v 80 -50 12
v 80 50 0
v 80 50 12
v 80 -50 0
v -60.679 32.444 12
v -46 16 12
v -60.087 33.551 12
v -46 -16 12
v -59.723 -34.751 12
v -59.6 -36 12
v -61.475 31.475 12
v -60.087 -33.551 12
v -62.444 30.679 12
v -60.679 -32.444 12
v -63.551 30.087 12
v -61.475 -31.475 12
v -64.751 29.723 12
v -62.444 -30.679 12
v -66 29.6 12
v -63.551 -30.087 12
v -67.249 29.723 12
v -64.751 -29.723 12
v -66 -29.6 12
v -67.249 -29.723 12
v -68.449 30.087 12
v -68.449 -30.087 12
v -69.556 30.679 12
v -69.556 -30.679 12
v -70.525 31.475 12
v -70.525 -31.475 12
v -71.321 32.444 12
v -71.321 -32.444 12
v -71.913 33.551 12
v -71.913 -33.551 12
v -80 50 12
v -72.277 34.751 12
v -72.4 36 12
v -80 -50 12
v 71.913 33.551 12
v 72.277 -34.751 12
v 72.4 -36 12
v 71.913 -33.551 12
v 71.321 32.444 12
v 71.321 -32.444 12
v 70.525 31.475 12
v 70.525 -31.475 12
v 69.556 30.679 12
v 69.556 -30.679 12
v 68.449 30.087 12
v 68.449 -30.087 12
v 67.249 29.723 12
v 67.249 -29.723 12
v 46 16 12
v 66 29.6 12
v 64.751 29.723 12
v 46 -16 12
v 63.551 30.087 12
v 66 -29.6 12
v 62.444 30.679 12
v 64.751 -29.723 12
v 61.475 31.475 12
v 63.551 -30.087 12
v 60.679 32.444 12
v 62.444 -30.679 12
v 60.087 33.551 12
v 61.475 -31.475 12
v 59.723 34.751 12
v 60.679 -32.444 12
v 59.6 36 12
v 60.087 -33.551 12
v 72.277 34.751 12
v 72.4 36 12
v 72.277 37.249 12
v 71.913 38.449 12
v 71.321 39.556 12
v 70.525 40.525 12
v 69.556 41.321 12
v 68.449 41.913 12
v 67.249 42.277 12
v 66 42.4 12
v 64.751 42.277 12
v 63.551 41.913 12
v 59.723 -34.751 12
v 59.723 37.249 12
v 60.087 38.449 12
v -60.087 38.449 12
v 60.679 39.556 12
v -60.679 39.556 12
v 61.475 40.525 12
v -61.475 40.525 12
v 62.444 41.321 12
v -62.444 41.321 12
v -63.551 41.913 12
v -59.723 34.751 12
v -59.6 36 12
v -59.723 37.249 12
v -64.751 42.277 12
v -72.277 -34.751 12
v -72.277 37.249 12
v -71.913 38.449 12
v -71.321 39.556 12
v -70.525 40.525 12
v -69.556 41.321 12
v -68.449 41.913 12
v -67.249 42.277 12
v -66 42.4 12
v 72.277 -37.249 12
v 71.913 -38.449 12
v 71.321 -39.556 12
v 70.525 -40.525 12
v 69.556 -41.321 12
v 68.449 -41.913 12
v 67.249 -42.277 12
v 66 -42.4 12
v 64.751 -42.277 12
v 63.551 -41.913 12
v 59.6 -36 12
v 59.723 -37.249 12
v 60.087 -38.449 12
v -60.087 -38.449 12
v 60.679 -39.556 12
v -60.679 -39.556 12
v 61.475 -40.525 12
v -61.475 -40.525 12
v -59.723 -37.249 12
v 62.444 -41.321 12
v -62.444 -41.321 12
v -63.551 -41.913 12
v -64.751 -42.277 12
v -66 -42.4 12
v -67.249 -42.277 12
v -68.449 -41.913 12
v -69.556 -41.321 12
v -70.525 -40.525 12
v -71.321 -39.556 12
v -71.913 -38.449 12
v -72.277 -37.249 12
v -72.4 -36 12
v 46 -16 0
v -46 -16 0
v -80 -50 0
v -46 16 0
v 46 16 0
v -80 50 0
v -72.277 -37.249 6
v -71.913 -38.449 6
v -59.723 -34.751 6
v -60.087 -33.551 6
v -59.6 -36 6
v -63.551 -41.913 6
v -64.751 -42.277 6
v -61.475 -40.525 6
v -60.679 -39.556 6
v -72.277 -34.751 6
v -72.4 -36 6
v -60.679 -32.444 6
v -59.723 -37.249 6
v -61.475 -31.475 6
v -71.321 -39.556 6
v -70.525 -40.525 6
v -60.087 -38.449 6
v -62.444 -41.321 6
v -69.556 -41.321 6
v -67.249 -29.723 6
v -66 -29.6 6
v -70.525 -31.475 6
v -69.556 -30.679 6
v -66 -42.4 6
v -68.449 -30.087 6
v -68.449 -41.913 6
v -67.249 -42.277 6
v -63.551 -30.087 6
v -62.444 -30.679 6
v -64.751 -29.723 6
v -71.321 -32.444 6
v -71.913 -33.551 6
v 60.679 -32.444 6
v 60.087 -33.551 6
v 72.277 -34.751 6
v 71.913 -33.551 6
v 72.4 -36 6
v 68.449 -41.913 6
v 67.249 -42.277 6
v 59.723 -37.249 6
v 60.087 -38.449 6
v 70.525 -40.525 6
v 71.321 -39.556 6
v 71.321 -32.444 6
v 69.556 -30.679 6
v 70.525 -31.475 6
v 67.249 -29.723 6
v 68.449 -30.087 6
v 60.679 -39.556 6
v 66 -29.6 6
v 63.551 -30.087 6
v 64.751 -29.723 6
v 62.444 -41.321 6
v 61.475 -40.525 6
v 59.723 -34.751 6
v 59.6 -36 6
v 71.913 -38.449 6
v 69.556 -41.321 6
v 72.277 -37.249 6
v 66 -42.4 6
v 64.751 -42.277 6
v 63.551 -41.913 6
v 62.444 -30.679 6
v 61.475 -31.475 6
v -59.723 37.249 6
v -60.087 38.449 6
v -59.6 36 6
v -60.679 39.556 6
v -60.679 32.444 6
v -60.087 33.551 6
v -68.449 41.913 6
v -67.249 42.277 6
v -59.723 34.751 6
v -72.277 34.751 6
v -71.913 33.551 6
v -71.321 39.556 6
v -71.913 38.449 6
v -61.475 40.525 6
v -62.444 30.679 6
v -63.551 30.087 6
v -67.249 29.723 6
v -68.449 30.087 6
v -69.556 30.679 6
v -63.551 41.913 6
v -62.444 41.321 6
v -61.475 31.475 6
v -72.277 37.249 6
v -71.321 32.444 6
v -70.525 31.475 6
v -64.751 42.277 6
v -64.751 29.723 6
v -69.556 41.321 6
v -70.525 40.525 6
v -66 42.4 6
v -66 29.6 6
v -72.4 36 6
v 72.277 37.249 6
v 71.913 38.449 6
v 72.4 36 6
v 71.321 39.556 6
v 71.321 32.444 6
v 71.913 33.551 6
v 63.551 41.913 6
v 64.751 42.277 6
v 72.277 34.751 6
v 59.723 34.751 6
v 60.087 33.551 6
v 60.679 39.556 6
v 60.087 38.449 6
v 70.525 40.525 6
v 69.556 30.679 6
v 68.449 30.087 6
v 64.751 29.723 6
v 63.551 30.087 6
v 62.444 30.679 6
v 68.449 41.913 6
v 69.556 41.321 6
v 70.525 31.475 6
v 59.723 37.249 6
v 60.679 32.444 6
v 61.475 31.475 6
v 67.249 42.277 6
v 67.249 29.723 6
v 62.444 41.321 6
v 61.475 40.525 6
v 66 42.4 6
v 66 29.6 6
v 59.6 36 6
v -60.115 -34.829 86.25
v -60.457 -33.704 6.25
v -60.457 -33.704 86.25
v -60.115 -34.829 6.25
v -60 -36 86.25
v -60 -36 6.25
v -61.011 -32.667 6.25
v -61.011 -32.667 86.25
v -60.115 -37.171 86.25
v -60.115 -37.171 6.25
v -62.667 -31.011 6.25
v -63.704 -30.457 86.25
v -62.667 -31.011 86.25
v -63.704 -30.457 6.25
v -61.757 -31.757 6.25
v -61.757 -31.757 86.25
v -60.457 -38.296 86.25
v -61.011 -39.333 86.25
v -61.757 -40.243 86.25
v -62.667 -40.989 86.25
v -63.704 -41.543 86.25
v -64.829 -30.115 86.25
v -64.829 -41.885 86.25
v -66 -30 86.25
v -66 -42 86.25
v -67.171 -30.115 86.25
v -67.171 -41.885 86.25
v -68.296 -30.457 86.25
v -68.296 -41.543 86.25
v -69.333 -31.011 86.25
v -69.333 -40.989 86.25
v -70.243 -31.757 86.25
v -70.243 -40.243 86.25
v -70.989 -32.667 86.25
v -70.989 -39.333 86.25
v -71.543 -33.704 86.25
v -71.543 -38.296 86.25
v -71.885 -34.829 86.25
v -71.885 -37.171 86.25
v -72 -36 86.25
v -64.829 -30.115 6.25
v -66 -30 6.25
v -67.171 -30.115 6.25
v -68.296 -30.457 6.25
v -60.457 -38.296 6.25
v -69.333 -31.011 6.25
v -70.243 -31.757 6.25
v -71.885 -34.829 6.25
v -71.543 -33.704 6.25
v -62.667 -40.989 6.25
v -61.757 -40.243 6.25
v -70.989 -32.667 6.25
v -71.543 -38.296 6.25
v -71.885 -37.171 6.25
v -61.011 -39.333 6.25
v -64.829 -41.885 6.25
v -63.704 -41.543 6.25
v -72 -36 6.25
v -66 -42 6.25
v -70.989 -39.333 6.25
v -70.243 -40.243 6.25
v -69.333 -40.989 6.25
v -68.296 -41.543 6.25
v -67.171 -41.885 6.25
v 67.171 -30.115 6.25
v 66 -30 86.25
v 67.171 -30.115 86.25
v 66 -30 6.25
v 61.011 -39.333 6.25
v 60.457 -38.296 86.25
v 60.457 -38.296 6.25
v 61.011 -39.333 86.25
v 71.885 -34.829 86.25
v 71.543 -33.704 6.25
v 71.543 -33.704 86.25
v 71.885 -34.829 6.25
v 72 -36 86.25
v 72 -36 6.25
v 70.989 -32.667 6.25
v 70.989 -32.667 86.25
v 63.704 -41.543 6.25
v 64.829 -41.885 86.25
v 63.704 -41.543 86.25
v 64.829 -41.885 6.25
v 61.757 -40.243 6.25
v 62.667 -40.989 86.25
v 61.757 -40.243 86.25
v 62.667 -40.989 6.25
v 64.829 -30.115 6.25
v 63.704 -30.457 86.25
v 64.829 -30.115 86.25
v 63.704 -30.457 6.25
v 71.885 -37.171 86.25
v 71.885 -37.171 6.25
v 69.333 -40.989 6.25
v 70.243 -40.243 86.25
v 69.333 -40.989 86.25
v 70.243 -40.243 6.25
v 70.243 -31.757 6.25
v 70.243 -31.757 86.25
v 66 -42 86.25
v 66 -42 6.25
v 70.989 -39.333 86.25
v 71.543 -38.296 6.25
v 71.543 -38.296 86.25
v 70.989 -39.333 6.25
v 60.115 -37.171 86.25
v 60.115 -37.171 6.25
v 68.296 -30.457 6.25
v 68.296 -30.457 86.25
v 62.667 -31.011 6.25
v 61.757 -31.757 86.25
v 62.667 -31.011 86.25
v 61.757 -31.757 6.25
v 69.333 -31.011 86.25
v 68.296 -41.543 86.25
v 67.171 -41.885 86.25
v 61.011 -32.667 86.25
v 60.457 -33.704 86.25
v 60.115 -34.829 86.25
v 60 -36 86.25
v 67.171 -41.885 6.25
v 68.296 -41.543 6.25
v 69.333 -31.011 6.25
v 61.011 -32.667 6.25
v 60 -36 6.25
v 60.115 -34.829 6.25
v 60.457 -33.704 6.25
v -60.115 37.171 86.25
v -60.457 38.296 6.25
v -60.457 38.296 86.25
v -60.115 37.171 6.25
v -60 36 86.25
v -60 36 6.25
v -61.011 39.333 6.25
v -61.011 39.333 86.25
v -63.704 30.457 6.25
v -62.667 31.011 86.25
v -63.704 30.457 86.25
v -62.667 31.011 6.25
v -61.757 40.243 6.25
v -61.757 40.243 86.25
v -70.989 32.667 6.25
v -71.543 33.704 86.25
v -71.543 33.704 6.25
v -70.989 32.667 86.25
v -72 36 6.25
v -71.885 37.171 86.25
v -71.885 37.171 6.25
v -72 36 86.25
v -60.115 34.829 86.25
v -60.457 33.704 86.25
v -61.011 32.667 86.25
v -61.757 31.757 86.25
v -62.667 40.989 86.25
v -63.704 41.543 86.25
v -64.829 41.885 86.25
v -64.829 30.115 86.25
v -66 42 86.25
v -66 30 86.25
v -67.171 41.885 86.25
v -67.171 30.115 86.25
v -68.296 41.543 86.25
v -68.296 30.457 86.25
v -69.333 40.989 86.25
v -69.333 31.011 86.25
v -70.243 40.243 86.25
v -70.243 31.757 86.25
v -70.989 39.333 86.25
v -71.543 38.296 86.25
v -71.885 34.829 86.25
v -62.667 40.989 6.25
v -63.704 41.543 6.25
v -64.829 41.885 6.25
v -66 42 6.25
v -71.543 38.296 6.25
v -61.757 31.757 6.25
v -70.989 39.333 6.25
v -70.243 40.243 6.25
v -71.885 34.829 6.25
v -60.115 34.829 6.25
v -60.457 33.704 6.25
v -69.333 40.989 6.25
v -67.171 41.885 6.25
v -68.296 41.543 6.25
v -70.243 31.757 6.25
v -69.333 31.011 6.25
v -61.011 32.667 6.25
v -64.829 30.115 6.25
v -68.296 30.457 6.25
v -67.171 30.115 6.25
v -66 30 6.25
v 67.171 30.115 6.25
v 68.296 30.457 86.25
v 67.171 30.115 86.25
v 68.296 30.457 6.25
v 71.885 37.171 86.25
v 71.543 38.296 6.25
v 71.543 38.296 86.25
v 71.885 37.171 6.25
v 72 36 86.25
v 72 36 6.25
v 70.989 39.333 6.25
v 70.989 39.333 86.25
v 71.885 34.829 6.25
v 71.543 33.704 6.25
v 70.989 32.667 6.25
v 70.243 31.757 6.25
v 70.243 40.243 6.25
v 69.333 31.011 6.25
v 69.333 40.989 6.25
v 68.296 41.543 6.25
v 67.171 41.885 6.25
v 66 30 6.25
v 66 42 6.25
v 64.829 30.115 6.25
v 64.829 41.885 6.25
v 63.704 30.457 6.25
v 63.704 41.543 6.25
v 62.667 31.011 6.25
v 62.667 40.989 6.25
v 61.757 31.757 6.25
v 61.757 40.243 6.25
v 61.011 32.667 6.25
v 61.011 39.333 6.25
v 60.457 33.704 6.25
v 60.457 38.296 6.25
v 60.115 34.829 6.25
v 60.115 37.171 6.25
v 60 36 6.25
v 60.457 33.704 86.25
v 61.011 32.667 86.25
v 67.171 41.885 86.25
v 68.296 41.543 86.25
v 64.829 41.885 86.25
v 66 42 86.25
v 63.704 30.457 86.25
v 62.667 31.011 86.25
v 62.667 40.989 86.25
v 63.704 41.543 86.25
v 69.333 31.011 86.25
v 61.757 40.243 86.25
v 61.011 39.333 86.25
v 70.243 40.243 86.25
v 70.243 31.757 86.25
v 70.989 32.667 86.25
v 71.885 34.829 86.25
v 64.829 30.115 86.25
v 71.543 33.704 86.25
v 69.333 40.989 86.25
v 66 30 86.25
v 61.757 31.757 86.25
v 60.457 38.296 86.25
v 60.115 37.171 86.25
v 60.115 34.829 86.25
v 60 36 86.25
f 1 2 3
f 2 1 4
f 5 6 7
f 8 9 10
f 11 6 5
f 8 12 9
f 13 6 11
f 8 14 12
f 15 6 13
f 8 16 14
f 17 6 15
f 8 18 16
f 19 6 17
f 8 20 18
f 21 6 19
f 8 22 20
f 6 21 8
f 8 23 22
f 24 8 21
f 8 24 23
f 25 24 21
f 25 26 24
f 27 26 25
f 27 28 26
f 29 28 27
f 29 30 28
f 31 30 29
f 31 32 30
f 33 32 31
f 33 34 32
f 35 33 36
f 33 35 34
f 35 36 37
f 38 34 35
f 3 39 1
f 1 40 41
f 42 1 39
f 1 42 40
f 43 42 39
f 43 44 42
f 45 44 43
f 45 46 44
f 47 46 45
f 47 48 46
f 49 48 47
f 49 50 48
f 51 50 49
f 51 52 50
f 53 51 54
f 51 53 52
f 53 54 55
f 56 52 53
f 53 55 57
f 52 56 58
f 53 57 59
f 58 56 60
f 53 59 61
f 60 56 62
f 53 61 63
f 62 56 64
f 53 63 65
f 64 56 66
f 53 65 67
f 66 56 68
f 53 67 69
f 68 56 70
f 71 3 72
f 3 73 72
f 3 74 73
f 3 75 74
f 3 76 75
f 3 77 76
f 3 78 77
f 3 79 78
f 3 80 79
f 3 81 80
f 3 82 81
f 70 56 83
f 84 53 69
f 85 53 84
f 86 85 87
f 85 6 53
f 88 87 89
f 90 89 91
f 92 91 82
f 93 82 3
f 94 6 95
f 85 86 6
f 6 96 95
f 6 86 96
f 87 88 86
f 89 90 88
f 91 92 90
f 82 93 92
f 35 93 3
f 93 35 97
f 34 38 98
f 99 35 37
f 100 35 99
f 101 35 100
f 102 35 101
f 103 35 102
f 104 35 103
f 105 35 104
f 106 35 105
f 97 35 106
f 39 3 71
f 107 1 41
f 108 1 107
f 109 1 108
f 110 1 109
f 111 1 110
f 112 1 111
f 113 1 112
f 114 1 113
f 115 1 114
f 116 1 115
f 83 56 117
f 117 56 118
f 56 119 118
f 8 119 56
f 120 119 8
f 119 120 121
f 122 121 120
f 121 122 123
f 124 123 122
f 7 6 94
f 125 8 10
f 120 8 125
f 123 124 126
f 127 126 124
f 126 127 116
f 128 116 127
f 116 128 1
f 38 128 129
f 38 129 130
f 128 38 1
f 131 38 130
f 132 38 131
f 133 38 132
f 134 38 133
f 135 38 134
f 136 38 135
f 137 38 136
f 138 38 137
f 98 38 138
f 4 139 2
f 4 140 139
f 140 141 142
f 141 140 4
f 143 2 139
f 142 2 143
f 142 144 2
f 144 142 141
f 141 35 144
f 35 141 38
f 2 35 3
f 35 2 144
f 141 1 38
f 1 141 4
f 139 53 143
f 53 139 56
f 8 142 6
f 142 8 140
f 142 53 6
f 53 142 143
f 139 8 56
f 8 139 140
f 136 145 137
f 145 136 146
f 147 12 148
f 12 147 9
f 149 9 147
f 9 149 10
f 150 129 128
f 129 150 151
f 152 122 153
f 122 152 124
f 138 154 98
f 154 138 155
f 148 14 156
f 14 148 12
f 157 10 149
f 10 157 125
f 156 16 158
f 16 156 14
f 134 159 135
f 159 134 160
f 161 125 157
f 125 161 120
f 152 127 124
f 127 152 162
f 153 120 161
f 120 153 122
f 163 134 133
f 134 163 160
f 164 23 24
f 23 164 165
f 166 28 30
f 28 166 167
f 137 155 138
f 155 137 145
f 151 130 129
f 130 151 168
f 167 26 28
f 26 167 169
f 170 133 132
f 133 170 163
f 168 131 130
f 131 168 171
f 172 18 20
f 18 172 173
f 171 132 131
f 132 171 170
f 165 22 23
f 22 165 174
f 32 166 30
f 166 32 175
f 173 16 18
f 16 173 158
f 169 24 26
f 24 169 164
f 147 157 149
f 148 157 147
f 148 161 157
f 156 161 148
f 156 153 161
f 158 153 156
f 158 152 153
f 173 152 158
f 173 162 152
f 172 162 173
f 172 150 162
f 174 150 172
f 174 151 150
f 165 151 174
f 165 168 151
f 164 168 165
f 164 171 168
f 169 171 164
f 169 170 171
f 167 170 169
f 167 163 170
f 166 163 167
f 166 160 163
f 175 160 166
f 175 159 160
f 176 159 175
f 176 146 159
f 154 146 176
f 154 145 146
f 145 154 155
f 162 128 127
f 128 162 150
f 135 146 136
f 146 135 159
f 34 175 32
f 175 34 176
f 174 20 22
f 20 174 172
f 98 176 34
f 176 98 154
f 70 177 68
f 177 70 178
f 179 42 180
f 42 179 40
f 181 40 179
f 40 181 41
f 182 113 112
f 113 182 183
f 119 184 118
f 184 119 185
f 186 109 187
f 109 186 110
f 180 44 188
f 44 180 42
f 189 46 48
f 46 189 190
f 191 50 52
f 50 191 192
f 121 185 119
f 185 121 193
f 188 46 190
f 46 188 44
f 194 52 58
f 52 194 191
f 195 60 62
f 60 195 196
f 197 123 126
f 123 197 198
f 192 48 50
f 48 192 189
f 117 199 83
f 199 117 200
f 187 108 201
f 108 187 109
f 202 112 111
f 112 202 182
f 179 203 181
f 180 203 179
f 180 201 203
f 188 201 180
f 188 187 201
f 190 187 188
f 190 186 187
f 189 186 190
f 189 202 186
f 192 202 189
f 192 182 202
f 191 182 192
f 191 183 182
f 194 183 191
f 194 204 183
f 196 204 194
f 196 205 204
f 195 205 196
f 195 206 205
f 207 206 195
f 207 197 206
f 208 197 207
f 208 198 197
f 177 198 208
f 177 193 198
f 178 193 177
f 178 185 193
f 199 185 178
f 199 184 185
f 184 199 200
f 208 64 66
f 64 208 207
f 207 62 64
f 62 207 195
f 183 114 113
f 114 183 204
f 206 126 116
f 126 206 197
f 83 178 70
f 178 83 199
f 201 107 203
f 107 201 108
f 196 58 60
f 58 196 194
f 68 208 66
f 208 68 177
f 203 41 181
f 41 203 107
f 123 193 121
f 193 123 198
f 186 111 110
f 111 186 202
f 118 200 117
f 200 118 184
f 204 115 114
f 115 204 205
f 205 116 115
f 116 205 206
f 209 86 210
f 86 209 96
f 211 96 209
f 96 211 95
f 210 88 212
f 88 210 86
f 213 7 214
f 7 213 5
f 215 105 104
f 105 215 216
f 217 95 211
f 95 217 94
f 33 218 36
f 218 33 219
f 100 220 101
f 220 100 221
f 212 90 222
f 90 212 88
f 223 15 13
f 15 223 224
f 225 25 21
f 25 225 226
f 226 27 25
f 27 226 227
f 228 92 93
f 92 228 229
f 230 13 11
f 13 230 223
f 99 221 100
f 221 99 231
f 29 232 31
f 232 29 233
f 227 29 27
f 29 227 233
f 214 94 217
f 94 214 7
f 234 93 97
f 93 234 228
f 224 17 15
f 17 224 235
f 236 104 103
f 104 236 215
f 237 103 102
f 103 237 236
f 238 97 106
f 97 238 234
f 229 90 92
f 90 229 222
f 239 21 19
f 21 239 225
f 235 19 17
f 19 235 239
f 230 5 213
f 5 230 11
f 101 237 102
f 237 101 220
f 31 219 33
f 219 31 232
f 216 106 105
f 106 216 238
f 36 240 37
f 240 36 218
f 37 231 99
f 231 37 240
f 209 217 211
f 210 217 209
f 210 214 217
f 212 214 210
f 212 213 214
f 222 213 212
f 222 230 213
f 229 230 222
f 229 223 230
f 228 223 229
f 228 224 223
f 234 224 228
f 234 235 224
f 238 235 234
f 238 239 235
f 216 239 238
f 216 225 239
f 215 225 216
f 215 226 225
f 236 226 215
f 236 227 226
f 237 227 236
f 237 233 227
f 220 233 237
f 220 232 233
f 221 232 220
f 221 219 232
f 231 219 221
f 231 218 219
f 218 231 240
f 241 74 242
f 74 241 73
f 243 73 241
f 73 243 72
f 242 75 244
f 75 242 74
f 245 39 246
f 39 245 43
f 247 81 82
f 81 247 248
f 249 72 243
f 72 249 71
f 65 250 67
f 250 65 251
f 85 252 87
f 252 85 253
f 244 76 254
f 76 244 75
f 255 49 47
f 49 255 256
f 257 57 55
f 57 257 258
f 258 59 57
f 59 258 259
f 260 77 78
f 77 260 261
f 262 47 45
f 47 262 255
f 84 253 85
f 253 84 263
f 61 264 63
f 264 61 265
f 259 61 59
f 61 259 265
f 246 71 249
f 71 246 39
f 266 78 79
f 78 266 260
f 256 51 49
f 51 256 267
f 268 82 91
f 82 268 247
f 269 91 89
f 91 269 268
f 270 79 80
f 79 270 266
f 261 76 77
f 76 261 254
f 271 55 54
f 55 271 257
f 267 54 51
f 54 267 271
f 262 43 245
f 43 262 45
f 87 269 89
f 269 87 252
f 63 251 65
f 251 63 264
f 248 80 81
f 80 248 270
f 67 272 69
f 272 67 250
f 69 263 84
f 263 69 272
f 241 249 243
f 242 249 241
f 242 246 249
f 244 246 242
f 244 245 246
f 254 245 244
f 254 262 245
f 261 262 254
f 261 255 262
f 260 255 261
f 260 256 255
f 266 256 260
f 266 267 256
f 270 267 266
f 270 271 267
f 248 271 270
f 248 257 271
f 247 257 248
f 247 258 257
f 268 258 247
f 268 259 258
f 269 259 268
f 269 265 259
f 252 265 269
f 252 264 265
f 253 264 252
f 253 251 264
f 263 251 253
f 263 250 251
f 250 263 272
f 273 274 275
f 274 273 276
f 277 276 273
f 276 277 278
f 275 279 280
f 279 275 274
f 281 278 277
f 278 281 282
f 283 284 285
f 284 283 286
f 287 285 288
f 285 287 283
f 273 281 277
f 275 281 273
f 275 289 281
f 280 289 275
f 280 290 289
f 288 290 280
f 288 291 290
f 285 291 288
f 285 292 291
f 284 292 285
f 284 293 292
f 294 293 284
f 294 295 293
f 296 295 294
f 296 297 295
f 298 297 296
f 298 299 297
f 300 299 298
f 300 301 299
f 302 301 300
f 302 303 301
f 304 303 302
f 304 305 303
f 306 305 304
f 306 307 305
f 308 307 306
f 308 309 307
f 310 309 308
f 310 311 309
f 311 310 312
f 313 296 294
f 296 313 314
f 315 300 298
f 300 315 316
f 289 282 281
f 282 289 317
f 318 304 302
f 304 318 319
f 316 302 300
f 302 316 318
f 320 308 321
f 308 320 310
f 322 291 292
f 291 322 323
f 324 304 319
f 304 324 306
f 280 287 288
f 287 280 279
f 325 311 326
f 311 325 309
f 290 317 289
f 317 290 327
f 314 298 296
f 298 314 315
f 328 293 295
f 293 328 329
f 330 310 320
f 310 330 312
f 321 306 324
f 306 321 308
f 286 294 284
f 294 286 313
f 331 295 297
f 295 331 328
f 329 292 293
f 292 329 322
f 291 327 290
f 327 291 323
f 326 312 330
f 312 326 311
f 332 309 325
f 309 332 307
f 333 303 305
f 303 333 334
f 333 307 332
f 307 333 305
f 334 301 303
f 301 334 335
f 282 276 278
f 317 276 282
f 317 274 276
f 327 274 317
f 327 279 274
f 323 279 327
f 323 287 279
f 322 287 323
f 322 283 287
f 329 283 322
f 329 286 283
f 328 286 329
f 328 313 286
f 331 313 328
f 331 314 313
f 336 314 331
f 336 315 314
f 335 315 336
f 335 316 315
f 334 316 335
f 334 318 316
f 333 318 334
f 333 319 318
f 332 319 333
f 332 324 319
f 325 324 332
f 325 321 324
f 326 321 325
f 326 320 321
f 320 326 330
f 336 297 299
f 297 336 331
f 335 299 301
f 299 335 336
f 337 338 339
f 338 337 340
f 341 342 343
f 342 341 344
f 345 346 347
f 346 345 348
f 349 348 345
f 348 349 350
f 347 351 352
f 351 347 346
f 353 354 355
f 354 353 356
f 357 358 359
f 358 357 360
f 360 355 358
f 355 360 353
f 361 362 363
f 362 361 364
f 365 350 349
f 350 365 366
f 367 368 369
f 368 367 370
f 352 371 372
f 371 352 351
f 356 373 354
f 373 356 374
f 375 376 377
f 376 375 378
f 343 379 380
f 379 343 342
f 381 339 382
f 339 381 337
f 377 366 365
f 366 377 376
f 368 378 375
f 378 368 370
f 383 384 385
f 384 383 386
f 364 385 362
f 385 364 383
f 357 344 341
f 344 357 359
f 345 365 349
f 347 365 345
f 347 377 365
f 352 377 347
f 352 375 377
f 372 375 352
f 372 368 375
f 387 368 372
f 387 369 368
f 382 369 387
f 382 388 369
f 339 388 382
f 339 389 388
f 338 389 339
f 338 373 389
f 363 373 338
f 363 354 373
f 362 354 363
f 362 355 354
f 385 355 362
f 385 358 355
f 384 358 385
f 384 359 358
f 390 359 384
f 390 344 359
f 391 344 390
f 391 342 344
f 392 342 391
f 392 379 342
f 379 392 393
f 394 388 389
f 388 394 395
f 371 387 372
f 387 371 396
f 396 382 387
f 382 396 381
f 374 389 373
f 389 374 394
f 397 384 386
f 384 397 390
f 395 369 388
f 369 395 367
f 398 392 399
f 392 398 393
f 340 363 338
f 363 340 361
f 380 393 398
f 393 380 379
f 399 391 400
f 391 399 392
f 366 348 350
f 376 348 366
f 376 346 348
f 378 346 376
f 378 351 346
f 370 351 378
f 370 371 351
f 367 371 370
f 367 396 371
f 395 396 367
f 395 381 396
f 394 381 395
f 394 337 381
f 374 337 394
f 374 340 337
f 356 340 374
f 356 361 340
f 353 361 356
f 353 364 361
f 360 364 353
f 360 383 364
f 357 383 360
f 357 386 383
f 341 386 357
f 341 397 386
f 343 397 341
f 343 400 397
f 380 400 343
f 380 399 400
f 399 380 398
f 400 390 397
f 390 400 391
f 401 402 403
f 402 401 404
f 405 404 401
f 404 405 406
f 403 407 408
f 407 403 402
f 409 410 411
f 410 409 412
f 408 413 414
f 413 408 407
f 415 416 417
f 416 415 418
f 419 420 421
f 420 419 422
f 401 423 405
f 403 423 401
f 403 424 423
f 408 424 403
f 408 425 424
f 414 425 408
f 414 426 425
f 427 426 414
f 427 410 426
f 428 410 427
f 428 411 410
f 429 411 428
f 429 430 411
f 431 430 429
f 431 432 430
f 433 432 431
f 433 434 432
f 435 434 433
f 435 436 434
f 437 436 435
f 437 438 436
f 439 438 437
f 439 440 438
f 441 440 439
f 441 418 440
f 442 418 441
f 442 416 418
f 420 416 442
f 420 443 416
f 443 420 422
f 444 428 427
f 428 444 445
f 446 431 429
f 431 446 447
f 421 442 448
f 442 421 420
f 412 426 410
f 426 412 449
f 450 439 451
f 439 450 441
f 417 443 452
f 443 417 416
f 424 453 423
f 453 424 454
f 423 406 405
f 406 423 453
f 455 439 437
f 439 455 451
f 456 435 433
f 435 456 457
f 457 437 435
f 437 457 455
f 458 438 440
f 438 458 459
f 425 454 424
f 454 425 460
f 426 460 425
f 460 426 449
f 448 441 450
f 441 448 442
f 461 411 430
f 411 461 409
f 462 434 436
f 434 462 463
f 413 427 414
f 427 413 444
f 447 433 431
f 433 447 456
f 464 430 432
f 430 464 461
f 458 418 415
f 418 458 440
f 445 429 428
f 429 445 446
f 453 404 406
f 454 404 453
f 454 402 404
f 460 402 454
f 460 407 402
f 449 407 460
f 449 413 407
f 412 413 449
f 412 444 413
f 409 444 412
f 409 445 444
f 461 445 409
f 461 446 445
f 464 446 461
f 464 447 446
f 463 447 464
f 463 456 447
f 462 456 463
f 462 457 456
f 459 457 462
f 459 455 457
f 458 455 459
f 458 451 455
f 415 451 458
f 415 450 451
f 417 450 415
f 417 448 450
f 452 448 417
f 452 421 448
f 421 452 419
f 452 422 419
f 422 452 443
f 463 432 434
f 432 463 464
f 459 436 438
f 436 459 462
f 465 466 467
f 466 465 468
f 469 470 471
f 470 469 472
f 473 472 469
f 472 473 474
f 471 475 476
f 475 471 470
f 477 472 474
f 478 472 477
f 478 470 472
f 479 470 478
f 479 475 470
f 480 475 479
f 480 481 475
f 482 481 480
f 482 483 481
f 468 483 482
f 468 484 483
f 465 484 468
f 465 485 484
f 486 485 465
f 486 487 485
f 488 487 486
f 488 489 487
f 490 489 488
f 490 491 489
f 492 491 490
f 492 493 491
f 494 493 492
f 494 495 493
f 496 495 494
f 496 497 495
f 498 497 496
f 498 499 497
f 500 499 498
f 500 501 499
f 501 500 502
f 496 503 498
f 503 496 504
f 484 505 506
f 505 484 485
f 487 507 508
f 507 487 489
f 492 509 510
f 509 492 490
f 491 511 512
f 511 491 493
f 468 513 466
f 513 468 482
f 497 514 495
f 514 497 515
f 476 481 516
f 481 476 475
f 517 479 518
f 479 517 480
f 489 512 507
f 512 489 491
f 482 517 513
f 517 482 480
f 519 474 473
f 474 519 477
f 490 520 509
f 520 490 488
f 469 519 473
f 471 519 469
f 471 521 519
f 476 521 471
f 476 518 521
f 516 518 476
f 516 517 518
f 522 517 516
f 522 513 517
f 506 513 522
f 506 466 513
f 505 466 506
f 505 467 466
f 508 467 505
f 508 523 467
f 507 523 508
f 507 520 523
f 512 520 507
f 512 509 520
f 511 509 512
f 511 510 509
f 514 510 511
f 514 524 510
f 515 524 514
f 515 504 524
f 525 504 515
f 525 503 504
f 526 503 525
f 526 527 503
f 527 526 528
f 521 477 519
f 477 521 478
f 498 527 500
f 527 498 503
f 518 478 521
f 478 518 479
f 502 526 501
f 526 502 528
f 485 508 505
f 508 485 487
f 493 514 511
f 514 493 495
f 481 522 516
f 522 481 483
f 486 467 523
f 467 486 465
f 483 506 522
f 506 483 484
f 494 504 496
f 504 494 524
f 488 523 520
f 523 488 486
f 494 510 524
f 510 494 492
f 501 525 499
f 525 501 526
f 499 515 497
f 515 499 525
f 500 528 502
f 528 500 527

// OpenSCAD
$fn = 32;

// ------------------------------------------------------------------------
// Frame with four posts: 160 x 100 mm frame, four d12 posts
// Every part is its own module, assembly() places them once.
// ------------------------------------------------------------------------

// --- part 1 ---
module base_frame() {
  difference() {
    translate([-80, -50, 0]) cube([160, 100, 12]);
    translate([-46, -16, -1]) cube([92, 32, 14]);
    translate([-66, -36, 6]) cylinder(h = 7, d = 12.8);
    translate([66, -36, 6]) cylinder(h = 7, d = 12.8);
    translate([-66, 36, 6]) cylinder(h = 7, d = 12.8);
    translate([66, 36, 6]) cylinder(h = 7, d = 12.8);
  }
}

// --- part 2 ---
module post1() {
  cylinder(h = 80, d = 12);
}

// --- part 3 ---
module post2() {
  cylinder(h = 80, d = 12);
}

// --- part 4 ---
module post3() {
  cylinder(h = 80, d = 12);
}

// --- part 5 ---
module post4() {
  cylinder(h = 80, d = 12);
}

// --- assembly ---
module assembly() {
  translate([0, 0, 0]) rotate([0, 0, 0]) base_frame();
  translate([-66, -36, 6.25]) rotate([0, 0, 0]) post1();
  translate([66, -36, 6.25]) rotate([0, 0, 0]) post2();
  translate([-66, 36, 6.25]) rotate([0, 0, 0]) post3();
  translate([66, 36, 6.25]) rotate([0, 0, 0]) post4();
}

assembly();
